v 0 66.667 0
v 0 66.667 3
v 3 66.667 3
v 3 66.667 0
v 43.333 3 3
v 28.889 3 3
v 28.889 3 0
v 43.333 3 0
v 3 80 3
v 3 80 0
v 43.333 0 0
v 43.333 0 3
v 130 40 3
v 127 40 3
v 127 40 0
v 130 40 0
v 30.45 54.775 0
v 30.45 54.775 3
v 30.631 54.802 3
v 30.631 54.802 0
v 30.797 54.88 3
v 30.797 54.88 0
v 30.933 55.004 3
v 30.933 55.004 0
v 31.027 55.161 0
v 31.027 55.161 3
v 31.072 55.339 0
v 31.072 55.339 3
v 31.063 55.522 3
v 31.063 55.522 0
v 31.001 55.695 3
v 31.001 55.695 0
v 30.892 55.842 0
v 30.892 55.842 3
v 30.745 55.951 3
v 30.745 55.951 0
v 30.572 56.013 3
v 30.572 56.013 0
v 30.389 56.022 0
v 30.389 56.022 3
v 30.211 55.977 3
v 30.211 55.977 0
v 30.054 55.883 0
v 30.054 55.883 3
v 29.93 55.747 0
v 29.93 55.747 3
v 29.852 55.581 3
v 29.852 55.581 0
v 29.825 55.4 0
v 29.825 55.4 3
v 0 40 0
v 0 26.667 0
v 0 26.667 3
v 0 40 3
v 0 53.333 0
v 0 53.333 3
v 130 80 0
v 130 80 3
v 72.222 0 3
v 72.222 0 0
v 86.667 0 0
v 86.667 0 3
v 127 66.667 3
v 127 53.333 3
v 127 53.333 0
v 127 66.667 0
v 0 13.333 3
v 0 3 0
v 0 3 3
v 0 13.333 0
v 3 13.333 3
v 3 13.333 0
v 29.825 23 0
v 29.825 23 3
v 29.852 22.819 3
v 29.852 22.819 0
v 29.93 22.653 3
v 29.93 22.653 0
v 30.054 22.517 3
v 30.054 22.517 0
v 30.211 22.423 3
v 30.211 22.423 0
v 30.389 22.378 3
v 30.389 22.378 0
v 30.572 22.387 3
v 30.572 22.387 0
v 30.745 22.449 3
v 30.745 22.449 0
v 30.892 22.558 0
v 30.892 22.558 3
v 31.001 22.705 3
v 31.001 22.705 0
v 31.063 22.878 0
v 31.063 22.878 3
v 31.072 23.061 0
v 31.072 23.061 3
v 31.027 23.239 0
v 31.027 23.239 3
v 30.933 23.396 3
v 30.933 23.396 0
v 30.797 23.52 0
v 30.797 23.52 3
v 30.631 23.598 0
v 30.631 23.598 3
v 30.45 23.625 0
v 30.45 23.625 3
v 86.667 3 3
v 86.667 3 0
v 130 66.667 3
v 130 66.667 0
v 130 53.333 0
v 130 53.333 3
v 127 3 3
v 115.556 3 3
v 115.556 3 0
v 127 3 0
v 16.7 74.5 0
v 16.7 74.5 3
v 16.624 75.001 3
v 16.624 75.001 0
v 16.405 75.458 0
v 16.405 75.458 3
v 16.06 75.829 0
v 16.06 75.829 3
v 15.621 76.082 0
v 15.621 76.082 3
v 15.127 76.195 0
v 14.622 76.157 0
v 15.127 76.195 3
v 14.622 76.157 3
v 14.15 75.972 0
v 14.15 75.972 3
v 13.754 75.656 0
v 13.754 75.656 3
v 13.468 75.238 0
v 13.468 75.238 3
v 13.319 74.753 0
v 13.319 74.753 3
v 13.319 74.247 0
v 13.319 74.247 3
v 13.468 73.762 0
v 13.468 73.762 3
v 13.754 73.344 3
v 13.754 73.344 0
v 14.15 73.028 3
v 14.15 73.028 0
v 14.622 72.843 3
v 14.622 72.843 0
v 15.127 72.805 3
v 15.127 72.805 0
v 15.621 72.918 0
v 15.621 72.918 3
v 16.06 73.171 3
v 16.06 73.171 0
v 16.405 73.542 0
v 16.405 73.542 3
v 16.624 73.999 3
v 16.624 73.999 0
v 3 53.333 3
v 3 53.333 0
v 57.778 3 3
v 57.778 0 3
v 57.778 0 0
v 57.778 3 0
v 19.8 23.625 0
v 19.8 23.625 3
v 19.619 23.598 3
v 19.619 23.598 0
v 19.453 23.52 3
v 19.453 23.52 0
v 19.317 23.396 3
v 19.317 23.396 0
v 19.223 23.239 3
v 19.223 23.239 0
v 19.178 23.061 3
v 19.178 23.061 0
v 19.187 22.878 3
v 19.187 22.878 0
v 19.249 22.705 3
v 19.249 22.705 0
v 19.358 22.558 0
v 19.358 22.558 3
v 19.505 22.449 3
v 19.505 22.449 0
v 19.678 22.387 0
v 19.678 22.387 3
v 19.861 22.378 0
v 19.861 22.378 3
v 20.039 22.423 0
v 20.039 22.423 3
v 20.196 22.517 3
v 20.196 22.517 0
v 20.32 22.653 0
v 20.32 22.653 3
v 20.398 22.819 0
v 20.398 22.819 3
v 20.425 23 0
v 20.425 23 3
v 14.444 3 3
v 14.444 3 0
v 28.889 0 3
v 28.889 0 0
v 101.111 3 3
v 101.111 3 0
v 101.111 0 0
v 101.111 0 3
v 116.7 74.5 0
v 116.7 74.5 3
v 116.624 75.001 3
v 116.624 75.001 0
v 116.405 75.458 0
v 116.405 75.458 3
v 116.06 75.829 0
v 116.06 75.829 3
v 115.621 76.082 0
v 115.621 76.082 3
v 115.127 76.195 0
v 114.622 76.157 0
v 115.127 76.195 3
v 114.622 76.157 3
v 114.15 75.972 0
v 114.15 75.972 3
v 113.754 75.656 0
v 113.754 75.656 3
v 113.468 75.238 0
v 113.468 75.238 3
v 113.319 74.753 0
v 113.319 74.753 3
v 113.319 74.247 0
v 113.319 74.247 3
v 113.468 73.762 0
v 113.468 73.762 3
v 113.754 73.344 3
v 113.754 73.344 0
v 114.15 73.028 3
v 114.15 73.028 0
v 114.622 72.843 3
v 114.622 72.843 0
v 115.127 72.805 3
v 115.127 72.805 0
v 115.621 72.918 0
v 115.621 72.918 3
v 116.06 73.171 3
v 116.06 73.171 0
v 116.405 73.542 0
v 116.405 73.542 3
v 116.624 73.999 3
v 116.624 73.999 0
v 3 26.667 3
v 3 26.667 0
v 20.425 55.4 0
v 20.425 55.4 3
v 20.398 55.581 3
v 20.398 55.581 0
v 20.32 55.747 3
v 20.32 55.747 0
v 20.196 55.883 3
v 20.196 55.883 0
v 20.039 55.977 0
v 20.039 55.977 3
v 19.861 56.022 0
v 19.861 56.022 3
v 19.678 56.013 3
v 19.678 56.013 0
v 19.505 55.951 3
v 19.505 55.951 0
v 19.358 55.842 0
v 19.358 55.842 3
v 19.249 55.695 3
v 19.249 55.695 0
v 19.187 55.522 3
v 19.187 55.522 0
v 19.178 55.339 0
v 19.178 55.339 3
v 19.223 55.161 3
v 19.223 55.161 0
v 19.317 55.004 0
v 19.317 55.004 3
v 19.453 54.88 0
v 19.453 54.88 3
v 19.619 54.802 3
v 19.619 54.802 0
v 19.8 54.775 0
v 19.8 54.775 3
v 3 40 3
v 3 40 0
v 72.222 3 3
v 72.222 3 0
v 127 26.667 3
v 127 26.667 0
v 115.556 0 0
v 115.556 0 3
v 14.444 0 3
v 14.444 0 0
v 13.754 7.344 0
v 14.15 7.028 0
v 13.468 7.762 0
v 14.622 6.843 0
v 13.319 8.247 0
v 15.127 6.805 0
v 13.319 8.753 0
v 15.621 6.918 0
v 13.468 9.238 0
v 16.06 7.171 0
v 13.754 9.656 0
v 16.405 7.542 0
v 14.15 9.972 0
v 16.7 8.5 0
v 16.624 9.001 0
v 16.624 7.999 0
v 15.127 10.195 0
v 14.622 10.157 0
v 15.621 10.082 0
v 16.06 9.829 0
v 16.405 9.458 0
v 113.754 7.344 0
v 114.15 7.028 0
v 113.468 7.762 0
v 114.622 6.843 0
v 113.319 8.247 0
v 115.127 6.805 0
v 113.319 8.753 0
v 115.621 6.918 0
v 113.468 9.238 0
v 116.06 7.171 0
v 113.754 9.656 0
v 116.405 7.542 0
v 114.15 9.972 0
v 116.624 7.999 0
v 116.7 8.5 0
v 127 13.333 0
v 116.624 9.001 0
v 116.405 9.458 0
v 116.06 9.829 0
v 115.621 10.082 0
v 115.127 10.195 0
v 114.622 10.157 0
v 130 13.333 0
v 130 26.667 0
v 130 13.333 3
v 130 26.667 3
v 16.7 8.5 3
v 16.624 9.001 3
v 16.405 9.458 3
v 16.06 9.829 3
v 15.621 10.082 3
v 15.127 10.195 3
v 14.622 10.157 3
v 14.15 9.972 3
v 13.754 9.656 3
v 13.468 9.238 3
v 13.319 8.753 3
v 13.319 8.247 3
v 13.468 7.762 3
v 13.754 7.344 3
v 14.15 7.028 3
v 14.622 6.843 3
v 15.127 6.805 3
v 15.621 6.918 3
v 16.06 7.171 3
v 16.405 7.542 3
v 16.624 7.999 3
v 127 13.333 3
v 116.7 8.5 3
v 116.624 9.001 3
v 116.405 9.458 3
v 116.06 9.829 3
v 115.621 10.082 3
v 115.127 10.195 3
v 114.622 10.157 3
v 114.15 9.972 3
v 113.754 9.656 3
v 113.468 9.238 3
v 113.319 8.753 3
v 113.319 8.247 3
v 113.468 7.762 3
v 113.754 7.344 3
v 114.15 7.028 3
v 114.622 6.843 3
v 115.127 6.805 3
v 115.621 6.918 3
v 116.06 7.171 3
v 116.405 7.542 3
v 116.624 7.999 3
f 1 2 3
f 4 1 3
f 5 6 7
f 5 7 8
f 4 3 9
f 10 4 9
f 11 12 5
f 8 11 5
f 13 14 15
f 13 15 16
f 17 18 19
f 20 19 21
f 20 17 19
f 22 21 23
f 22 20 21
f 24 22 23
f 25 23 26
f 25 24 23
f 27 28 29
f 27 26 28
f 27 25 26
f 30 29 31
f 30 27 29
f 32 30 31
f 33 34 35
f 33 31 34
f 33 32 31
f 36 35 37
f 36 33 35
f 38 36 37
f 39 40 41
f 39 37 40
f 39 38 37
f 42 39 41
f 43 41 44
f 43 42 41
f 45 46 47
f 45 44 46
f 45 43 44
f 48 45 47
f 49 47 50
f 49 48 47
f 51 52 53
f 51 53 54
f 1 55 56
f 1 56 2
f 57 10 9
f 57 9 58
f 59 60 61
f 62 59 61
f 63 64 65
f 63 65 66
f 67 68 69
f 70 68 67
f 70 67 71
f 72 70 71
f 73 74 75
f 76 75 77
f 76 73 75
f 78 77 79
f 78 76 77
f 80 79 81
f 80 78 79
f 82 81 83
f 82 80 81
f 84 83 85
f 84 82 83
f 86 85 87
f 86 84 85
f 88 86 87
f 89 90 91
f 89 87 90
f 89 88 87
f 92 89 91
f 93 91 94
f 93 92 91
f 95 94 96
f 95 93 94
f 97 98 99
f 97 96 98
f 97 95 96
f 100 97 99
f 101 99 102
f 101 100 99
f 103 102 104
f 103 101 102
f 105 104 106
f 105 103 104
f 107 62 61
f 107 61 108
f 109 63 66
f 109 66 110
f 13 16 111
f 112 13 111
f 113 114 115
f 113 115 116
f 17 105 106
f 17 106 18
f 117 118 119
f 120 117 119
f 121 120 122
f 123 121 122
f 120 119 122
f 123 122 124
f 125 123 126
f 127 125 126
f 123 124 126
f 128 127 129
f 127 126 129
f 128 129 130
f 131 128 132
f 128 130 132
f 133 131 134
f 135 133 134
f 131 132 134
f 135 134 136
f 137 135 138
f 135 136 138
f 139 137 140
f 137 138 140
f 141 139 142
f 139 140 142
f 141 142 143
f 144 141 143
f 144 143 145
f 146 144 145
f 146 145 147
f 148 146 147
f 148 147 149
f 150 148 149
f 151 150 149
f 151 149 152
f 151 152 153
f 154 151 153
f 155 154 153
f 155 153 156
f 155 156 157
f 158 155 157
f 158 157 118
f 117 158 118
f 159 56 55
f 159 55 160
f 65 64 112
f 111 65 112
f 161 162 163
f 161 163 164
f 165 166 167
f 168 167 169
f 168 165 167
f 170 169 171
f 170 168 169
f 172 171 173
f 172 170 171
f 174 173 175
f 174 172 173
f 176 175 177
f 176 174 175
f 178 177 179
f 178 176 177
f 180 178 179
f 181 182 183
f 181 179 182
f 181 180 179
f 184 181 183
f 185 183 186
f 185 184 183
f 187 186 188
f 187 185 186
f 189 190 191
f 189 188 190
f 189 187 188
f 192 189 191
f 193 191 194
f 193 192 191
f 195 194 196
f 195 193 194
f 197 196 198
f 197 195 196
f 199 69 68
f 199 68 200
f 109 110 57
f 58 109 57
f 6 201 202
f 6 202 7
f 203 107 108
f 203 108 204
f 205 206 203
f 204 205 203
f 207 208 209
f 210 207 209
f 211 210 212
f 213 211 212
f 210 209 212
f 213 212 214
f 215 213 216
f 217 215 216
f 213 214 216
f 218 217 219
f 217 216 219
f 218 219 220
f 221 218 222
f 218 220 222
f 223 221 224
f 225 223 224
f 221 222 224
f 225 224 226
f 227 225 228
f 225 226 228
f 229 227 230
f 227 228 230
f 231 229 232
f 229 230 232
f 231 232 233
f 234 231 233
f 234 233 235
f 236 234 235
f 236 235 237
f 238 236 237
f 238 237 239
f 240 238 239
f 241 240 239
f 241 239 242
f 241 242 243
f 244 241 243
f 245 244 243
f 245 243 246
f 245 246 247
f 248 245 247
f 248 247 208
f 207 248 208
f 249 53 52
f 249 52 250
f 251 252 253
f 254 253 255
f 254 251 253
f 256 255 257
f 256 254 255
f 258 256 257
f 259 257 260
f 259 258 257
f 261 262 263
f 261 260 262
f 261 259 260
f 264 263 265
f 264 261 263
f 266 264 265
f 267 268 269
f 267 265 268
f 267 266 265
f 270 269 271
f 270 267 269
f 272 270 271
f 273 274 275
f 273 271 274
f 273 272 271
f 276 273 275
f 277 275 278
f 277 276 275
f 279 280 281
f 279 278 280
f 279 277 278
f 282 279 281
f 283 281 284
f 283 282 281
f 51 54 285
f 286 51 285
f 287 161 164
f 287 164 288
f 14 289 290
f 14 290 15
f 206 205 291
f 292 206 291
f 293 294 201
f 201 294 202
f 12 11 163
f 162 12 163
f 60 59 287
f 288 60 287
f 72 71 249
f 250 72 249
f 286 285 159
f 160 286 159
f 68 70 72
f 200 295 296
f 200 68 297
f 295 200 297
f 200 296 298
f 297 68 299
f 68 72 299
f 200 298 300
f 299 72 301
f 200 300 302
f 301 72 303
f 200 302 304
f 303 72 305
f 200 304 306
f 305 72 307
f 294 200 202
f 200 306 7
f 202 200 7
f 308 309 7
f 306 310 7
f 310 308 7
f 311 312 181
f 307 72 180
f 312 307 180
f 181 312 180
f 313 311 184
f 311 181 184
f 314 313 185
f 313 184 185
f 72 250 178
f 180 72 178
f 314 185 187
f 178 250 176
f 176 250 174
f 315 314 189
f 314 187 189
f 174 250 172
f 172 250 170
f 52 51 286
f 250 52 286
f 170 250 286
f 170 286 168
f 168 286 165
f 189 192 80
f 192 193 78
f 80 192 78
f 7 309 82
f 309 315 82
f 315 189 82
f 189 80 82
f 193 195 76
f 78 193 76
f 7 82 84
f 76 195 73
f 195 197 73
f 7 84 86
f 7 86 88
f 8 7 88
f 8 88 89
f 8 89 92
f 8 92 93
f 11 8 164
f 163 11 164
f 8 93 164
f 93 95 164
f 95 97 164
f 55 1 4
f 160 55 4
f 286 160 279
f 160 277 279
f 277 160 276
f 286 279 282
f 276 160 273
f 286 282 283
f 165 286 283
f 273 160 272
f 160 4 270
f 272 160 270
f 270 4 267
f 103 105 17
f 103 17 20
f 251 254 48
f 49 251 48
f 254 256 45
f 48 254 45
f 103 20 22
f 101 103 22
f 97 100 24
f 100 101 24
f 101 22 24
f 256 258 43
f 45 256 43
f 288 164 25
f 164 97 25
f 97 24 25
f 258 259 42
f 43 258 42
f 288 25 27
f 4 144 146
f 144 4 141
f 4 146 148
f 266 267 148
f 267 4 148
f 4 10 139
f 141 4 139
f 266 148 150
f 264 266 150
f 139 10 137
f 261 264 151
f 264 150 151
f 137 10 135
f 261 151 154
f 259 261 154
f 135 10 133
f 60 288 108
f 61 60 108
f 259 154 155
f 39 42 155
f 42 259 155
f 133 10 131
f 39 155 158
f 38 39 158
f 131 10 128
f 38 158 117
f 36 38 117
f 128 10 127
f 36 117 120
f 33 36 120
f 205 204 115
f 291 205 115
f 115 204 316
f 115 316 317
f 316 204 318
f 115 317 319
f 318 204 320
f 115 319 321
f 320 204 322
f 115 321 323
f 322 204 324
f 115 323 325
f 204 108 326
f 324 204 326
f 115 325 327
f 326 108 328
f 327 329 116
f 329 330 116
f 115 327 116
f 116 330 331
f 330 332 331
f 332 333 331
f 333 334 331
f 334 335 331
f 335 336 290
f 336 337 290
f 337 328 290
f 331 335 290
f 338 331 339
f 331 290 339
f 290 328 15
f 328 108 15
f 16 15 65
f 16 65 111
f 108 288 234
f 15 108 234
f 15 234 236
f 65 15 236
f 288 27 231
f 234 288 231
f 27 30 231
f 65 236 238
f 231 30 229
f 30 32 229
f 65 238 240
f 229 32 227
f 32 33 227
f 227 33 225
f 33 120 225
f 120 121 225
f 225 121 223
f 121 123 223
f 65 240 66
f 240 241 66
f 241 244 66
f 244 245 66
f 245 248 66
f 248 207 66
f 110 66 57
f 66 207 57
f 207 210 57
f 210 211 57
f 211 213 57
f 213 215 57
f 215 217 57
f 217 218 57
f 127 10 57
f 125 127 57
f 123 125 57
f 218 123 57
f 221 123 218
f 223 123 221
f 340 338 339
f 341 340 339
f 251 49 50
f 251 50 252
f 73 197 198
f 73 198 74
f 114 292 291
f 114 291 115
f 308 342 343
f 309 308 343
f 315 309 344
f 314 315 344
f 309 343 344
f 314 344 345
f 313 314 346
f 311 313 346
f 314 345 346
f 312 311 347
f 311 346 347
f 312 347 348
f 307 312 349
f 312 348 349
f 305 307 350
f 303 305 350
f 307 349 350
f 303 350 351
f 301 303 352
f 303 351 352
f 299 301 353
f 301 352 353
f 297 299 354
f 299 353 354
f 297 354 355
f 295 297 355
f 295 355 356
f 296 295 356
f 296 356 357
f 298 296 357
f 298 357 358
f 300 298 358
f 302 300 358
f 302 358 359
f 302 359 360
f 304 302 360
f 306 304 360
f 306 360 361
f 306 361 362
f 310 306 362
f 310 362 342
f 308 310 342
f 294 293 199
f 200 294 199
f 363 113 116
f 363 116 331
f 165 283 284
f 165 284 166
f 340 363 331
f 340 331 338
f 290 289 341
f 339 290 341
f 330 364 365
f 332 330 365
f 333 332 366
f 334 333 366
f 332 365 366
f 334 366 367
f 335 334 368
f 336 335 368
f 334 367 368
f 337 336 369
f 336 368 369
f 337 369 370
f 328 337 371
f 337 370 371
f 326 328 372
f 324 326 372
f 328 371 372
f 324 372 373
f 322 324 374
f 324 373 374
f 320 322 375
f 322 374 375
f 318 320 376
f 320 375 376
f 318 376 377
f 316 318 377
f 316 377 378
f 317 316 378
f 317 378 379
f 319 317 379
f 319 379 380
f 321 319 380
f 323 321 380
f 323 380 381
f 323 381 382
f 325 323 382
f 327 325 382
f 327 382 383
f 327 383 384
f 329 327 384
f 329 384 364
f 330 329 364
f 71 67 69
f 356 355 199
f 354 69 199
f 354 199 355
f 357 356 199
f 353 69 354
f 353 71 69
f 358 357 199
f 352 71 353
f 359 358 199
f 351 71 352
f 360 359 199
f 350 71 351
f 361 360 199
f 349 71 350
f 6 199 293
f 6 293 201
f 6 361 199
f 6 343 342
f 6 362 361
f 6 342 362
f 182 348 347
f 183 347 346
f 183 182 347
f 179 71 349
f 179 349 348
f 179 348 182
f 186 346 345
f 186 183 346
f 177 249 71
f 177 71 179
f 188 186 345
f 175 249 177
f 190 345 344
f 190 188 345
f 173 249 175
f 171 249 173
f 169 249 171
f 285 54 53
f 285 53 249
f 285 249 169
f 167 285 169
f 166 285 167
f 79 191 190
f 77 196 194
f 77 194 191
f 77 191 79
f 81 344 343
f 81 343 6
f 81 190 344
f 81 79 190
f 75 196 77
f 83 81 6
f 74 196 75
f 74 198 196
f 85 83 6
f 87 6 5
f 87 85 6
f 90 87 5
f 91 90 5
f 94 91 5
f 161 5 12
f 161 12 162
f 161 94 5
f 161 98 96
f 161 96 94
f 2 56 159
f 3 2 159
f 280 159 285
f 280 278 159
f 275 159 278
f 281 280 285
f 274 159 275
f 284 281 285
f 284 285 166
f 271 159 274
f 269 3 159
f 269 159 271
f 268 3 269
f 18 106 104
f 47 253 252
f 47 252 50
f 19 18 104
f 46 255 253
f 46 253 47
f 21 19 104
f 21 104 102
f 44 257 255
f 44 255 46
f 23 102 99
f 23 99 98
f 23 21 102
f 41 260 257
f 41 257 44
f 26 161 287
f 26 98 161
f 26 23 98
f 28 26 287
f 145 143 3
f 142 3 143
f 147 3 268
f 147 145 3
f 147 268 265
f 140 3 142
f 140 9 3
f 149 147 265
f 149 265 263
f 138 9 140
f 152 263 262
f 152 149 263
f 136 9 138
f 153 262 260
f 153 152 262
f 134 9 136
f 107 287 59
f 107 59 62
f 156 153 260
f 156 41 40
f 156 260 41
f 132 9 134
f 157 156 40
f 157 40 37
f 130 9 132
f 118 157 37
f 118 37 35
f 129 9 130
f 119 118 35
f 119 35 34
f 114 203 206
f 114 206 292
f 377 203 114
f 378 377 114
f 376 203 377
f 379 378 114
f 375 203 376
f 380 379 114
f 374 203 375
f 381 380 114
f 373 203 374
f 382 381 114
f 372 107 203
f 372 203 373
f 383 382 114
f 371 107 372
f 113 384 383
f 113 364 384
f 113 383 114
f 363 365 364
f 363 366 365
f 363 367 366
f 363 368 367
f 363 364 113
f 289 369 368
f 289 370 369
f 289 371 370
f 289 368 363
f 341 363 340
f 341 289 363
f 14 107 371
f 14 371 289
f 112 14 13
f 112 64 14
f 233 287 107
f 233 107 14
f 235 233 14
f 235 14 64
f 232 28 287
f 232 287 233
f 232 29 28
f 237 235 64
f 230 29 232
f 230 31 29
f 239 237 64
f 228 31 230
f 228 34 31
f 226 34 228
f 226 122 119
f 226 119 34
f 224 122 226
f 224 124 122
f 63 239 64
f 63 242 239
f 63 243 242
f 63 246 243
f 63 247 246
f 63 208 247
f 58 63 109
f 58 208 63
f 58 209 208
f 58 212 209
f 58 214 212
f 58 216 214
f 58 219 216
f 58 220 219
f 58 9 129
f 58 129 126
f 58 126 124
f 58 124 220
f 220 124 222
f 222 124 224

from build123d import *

# Parameters (mm, degrees)
SKETCH1_W                   = 130
SKETCH1_H                   = 80
BOSS_EXTRUDE1_DEPTH         = 3
SKETCH2_W                   = 14.444444444
SKETCH2_H                   = 3
SKETCH2_W_2                 = 3
SKETCH2_H_2                 = 13.333333334
SKETCH2_H_3                 = 13.333333333
CUT_EXTRUDE1_DEPTH          = 153.672852859
CUT_CORNERPIECE_HOLES_REACH = 154.673
SKETCH3_R                   = 1.7
CUT_EXTRUDE3_REACH          = 154.673


with BuildPart() as part:
    # Sketch1 → Boss-Extrude1 (new body)
    with BuildSketch(Plane.XY):
        with Locations((65, 40)):
            Rectangle(SKETCH1_W, SKETCH1_H)
    extrude(amount=BOSS_EXTRUDE1_DEPTH)

    # Sketch2 → Cut-Extrude1 (cut, through all)
    with BuildSketch(Plane.XY.offset(3)):
        with Locations((7.222222222, 1.5)):
            Rectangle(SKETCH2_W, SKETCH2_H)
        with Locations((36.111111111, 1.5)):
            Rectangle(SKETCH2_W, SKETCH2_H)
        with Locations((65, 1.5)):
            Rectangle(SKETCH2_W, SKETCH2_H)
        with Locations((93.888888889, 1.5)):
            Rectangle(SKETCH2_W, SKETCH2_H)
        Polygon((115.555555556, 0), (115.555555556, 3), (127, 3), (127, 13.333333333), (130, 13.333333333), (130, 0), align=None)
        with Locations((1.5, 20)):
            Rectangle(SKETCH2_W_2, SKETCH2_H_2)
        with Locations((1.5, 46.666666667)):
            Rectangle(SKETCH2_W_2, SKETCH2_H_3)
        with Locations((1.5, 73.333333334)):
            Rectangle(SKETCH2_W_2, SKETCH2_H_3)
        with Locations((128.5, 33.333333334)):
            Rectangle(SKETCH2_W_2, SKETCH2_H_3)
        with Locations((128.5, 60)):
            Rectangle(SKETCH2_W_2, SKETCH2_H_2)
    extrude(amount=-CUT_EXTRUDE1_DEPTH, mode=Mode.SUBTRACT)

    # Sketch3 → Cut cornerpiece holes (cut, up to next)
    with BuildSketch(Plane.XY.offset(3), mode=Mode.PRIVATE) as cut_cornerpiece_holes_sk1:
        with Locations((15, 74.5)):
            Circle(SKETCH3_R)
    cut_cornerpiece_holes_tool1 = extrude(cut_cornerpiece_holes_sk1.sketch, amount=-CUT_CORNERPIECE_HOLES_REACH, mode=Mode.PRIVATE) & part.part
    # Sketch3 → Cut cornerpiece holes (cut, up to next)
    with BuildSketch(Plane.XY.offset(3), mode=Mode.PRIVATE) as cut_cornerpiece_holes_sk2:
        with Locations((115, 74.5)):
            Circle(SKETCH3_R)
    cut_cornerpiece_holes_tool2 = extrude(cut_cornerpiece_holes_sk2.sketch, amount=-CUT_CORNERPIECE_HOLES_REACH, mode=Mode.PRIVATE) & part.part
    # Sketch3 → Cut cornerpiece holes (cut, up to next)
    with BuildSketch(Plane.XY.offset(3), mode=Mode.PRIVATE) as cut_cornerpiece_holes_sk3:
        with Locations((15, 8.5)):
            Circle(SKETCH3_R)
    cut_cornerpiece_holes_tool3 = extrude(cut_cornerpiece_holes_sk3.sketch, amount=-CUT_CORNERPIECE_HOLES_REACH, mode=Mode.PRIVATE) & part.part
    # Sketch3 → Cut cornerpiece holes (cut, up to next)
    with BuildSketch(Plane.XY.offset(3), mode=Mode.PRIVATE) as cut_cornerpiece_holes_sk4:
        with Locations((115, 8.5)):
            Circle(SKETCH3_R)
    cut_cornerpiece_holes_tool4 = extrude(cut_cornerpiece_holes_sk4.sketch, amount=-CUT_CORNERPIECE_HOLES_REACH, mode=Mode.PRIVATE) & part.part
    add(cut_cornerpiece_holes_tool1.solids().sort_by_distance((15, 74.5, 3))[0], mode=Mode.SUBTRACT)
    add(cut_cornerpiece_holes_tool2.solids().sort_by_distance((115, 74.5, 3))[0], mode=Mode.SUBTRACT)
    add(cut_cornerpiece_holes_tool3.solids().sort_by_distance((15, 8.5, 3))[0], mode=Mode.SUBTRACT)
    add(cut_cornerpiece_holes_tool4.solids().sort_by_distance((115, 8.5, 3))[0], mode=Mode.SUBTRACT)

    # Sketch4 → Cut-Extrude3 (cut, up to next)
    with BuildSketch(Plane(origin=(0, 0, 0), x_dir=(-1, 0, 0), z_dir=(0, 0, -1)), mode=Mode.PRIVATE) as cut_extrude3_sk1:
        with BuildLine():
            Line((-29.825, 55.4), (-20.425, 55.4))
            ThreePointArc((-20.425, 55.4), (-19.358058262, 55.841941738), (-19.8, 54.775))
            Line((-19.8, 54.775), (-19.8, 23.625))
            ThreePointArc((-19.8, 23.625), (-19.358058262, 22.558058262), (-20.425, 23))
            Line((-20.425, 23), (-29.825, 23))
            ThreePointArc((-29.825, 23), (-30.891941738, 22.558058262), (-30.45, 23.625))
            Line((-30.45, 23.625), (-30.45, 54.775))
            ThreePointArc((-30.45, 54.775), (-30.891941738, 55.841941738), (-29.825, 55.4))
        make_face()
    cut_extrude3_tool1 = extrude(cut_extrude3_sk1.sketch, amount=-CUT_EXTRUDE3_REACH, mode=Mode.PRIVATE) & part.part
    add(cut_extrude3_tool1.solids().sort_by_distance((25.125, 39.2, 0))[0], mode=Mode.SUBTRACT)


solid = part.part
